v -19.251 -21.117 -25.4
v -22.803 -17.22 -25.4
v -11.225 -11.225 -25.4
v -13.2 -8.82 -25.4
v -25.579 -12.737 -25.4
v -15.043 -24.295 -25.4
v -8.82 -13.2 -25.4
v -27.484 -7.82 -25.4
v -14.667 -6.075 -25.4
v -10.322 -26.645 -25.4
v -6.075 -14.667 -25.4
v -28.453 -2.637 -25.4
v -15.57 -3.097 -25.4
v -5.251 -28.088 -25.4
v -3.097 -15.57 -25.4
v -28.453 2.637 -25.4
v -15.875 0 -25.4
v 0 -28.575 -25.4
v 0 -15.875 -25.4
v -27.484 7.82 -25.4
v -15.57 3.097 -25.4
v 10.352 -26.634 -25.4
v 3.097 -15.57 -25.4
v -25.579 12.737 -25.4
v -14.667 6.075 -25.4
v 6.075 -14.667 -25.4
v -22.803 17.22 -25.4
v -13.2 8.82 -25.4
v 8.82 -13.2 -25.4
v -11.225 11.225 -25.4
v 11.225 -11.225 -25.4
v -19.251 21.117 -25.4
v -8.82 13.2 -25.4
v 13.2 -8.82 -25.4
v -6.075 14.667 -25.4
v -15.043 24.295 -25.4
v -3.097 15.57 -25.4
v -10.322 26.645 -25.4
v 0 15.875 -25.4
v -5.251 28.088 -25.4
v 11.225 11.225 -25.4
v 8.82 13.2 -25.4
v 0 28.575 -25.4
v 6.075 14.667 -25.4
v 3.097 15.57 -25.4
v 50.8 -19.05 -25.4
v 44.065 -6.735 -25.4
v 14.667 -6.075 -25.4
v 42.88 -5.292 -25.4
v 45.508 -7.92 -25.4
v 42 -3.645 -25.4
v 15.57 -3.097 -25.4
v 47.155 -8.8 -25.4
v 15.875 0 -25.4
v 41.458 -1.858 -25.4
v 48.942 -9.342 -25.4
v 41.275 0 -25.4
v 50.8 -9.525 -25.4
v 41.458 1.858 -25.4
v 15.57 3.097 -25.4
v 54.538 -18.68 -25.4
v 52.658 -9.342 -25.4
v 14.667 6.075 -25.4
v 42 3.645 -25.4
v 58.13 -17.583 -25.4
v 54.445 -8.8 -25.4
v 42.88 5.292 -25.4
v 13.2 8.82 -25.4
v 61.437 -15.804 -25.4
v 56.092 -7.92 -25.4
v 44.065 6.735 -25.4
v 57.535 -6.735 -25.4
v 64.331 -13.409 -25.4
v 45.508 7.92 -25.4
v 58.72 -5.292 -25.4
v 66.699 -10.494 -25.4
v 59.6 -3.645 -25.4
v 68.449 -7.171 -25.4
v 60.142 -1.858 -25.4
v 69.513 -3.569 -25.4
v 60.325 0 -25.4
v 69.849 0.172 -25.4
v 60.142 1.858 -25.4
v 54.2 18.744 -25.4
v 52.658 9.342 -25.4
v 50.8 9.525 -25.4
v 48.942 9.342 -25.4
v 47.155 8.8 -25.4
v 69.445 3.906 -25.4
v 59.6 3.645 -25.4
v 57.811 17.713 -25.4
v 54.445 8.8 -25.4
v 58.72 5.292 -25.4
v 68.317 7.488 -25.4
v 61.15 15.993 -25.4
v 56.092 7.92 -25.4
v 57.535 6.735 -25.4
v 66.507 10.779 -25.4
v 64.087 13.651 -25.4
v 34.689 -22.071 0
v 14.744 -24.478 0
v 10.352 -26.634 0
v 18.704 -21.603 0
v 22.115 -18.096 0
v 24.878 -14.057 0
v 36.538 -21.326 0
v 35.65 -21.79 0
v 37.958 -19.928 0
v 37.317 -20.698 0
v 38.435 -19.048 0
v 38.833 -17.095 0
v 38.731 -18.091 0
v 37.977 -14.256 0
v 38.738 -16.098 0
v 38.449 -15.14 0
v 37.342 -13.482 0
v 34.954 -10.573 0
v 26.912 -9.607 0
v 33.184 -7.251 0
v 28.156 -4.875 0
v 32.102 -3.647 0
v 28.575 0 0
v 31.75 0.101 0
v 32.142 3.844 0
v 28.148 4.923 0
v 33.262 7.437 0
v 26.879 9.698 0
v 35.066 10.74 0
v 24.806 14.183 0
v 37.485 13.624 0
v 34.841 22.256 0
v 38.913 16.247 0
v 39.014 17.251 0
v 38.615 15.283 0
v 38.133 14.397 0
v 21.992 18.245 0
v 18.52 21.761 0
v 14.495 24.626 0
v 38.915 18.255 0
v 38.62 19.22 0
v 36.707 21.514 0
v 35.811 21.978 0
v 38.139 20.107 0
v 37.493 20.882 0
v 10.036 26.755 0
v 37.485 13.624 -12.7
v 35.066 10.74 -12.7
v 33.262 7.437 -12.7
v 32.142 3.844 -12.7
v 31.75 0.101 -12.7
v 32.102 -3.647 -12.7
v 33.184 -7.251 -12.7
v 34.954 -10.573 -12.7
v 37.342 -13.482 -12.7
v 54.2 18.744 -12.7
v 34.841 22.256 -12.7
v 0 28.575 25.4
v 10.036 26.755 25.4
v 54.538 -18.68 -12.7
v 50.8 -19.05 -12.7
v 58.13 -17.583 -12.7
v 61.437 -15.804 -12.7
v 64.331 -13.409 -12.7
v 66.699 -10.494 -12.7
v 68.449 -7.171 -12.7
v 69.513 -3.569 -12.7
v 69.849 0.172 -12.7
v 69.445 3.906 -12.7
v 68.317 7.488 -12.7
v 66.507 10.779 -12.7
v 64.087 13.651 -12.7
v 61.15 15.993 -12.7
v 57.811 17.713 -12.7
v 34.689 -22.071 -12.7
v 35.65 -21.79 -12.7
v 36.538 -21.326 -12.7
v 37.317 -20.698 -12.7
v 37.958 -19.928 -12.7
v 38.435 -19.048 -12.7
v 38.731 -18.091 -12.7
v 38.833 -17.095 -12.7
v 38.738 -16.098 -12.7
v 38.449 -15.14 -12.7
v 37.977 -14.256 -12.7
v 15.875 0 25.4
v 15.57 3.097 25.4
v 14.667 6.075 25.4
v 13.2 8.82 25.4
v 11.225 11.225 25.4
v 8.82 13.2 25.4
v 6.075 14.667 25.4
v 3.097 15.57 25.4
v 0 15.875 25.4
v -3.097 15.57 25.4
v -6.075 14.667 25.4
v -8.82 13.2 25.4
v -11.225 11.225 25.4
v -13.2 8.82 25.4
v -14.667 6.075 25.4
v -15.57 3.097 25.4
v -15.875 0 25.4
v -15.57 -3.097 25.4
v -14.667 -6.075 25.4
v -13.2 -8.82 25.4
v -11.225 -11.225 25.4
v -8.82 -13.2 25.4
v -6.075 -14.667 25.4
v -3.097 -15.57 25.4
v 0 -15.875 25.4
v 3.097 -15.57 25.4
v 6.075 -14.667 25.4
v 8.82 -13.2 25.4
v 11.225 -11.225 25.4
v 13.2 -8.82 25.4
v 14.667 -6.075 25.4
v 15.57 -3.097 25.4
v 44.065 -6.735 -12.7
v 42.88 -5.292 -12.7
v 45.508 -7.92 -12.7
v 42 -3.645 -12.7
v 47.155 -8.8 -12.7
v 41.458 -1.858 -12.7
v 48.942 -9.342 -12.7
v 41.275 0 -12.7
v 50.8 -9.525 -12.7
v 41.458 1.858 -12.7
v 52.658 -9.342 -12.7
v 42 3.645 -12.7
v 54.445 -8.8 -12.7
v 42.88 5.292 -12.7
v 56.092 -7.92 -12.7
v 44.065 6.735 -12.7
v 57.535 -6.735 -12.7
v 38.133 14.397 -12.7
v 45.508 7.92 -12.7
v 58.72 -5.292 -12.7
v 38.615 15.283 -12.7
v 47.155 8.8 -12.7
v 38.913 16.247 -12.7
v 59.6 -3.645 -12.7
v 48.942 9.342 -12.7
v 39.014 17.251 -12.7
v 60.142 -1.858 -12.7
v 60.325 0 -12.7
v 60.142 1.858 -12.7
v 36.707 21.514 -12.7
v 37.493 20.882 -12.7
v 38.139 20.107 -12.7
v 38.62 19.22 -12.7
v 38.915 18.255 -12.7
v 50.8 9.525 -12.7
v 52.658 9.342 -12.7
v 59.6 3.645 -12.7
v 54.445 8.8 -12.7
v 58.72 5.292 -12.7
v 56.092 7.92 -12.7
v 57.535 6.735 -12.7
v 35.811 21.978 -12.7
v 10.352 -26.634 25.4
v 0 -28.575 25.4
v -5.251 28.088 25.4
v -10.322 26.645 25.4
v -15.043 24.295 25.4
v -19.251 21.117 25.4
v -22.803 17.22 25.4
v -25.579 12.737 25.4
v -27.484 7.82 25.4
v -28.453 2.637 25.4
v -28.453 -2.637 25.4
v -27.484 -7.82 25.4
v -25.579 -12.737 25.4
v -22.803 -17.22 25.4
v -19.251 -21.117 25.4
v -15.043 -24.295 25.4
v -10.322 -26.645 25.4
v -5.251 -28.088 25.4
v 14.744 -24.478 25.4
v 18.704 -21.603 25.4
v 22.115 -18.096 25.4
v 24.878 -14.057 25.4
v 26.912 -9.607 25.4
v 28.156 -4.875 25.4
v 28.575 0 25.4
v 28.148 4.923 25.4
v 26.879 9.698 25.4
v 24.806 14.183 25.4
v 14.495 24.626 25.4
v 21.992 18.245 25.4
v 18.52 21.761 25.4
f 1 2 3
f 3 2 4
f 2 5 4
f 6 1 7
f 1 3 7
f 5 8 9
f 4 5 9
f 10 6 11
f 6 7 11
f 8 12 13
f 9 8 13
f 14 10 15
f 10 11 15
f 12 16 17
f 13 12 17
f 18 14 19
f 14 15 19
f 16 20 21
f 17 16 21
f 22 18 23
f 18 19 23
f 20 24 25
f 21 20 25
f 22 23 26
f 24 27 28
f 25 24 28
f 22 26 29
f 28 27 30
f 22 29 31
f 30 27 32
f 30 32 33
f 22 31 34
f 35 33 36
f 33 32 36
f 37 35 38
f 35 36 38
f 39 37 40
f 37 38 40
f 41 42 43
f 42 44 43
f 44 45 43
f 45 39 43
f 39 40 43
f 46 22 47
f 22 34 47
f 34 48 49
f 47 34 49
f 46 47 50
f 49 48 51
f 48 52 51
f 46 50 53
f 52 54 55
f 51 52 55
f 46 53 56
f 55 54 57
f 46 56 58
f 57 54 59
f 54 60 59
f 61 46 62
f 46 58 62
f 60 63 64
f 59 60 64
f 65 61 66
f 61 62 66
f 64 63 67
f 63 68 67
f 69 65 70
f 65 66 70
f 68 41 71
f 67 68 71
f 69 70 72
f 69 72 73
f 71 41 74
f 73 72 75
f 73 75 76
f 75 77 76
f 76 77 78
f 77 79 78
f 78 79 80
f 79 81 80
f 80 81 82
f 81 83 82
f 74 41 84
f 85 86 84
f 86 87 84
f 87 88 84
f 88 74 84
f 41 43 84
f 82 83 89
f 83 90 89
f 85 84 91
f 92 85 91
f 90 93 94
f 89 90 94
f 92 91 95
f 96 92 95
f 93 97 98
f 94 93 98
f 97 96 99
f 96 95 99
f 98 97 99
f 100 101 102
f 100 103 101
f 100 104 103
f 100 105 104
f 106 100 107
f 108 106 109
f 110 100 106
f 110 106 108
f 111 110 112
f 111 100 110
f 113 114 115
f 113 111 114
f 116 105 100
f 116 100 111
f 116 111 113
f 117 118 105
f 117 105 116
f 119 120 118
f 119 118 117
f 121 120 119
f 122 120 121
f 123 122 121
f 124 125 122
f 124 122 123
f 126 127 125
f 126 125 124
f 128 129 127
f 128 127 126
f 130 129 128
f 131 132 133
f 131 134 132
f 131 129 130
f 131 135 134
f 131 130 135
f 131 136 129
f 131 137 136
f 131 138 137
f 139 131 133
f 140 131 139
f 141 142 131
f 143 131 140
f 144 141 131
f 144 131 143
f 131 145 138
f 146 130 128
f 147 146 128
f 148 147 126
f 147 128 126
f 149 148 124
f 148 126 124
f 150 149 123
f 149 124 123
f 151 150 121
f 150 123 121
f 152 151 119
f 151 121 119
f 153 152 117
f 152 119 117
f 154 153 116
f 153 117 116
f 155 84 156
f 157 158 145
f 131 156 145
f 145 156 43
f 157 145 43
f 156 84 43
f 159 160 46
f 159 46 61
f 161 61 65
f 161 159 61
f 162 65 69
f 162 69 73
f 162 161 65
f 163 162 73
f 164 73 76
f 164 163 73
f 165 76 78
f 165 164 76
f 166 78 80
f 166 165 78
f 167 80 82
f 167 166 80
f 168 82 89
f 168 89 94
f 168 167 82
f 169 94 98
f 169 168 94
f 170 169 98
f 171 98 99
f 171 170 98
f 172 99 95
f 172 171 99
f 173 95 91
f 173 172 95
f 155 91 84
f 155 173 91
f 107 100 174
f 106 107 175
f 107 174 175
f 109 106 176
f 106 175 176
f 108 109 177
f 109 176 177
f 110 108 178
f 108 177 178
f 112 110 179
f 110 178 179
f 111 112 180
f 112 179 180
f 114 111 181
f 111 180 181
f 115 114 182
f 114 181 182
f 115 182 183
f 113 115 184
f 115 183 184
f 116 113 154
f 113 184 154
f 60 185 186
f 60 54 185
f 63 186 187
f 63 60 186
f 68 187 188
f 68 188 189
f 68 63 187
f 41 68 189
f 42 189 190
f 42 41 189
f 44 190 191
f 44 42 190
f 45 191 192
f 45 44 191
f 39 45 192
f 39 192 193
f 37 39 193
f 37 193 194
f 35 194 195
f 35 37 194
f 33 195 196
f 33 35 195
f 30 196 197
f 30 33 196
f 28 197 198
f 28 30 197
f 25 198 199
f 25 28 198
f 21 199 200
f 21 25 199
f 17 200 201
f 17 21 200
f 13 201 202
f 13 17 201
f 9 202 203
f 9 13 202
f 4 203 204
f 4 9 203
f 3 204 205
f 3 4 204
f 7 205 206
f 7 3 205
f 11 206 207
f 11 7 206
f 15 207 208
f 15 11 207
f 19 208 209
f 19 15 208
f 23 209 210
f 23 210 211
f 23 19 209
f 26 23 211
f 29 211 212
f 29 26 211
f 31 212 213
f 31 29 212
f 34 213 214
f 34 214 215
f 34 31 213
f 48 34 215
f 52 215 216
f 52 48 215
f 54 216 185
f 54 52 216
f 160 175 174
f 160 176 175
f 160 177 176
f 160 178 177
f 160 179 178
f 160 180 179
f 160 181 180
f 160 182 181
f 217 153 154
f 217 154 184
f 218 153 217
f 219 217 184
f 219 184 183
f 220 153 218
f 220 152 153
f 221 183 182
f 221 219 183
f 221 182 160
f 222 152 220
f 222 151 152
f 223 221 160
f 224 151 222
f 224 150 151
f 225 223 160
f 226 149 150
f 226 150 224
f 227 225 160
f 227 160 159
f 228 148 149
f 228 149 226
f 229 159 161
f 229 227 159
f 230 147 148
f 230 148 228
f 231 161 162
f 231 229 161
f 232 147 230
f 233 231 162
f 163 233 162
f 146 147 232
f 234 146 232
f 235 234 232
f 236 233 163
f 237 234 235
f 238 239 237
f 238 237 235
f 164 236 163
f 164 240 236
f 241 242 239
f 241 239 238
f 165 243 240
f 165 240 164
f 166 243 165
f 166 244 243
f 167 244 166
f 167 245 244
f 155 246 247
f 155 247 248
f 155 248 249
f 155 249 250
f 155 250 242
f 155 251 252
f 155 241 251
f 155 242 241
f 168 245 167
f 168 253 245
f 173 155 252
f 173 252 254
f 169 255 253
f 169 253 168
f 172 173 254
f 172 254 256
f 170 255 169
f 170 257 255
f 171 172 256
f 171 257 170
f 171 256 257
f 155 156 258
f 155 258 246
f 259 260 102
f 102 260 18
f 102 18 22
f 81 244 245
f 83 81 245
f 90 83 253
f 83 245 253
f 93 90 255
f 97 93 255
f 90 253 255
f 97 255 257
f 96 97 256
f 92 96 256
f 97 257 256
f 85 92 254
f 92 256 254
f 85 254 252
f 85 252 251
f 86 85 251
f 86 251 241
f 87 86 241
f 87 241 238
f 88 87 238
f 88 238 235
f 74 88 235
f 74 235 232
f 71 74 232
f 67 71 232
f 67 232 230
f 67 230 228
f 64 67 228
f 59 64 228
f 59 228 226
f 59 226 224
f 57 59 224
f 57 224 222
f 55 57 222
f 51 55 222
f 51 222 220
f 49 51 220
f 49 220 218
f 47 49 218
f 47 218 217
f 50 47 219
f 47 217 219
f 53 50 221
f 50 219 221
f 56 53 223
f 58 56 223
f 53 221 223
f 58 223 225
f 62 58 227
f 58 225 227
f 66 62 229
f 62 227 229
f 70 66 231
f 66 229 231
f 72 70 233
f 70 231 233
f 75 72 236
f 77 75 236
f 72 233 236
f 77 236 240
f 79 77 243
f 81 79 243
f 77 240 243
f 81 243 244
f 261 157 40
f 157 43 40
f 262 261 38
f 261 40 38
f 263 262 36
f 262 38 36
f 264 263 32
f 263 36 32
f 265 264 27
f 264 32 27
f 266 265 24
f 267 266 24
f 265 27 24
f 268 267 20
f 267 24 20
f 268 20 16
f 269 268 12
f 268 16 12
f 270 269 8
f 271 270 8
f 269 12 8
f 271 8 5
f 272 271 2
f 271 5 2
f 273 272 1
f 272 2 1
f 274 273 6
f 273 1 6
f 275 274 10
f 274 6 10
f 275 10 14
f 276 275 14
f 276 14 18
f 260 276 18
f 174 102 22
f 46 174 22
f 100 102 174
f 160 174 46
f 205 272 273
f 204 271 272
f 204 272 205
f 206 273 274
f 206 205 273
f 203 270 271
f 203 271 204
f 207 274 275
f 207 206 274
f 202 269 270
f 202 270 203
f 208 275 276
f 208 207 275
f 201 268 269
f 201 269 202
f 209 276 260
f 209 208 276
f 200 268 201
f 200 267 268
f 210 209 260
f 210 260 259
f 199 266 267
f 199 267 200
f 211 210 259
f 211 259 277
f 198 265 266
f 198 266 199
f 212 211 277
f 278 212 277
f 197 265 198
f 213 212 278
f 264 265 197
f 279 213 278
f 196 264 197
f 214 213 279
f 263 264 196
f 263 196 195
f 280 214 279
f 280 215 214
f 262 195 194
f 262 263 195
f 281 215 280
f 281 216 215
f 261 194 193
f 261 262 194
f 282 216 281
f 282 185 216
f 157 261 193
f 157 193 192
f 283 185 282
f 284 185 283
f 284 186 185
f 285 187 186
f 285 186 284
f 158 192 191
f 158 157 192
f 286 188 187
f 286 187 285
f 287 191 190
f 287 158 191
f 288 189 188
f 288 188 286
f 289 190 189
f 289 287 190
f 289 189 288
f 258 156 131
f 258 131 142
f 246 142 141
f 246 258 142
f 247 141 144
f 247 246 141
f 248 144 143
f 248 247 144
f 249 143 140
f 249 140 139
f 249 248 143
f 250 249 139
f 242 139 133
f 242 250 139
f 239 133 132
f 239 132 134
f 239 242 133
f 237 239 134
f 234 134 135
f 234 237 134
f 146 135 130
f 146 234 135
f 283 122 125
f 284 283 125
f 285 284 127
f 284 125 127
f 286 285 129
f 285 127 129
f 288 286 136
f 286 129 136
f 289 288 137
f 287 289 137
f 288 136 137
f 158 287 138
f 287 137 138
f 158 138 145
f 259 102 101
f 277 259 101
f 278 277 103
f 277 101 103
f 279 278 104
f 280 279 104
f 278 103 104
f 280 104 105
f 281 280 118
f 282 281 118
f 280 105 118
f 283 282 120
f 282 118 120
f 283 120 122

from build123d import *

# Parameters (mm, degrees)
F0_R        = 15.875
F0_R_2      = 9.525
F1_DEPTH    = 25.4
F2_DEPTH    = 25.4
F3_DEPTH    = 12.7
F4_T1_DEPTH = 53.6792843218
F4_T3_DEPTH = 61.8868884968


# Not quite as in the source:
# - a fillet or chamfer that OpenCascade refuses, or shapes differently, is made with other operations: its cross-section is extruded or revolved along the edge and cut away or added


with BuildPart() as f1:
    # F0 (on Top) → F1 (new body)
    with BuildSketch(Plane.XY):
        with BuildLine():
            Line((10.035773719, 26.7546981082), (0, 28.575))
            ThreePointArc((0, 28.575), (-28.575, 0), (0, -28.575))
            Line((0, -28.575), (10.3516981132, -26.6340566038))
            ThreePointArc((10.3516981132, -26.6340566038), (23.5831549902, -16.135842888), (28.575, 0))
            ThreePointArc((28.575, 0), (23.4872610048, 16.2751096921), (10.035773719, 26.7546981082))
        make_face()
        Circle(F0_R, mode=Mode.SUBTRACT)
        with BuildLine():
            Line((54.1998407335, 18.7441613039), (10.035773719, 26.7546981082))
            ThreePointArc((10.035773719, 26.7546981082), (23.4872610048, 16.2751096921), (28.575, 0))
            ThreePointArc((28.575, 0), (23.5831549902, -16.135842888), (10.3516981132, -26.6340566038))
            Line((10.3516981132, -26.6340566038), (50.8, -19.05))
            ThreePointArc((50.8, -19.05), (31.8266137334, 1.7067845735), (54.1998407335, 18.7441613039))
        make_face()
        with BuildLine():
            ThreePointArc((69.85, 0), (65.4230890371, 12.2093311452), (54.1998407335, 18.7441613039))
            ThreePointArc((54.1998407335, 18.7441613039), (31.8266137334, 1.7067845735), (50.8, -19.05))
            ThreePointArc((50.8, -19.05), (64.2703841816, -13.4703841816), (69.85, 0))
        make_face()
        with Locations((50.8, 0)):
            Circle(F0_R_2, mode=Mode.SUBTRACT)
    extrude(amount=-F1_DEPTH)

    # F0 (on Top) → F2 (join)
    with BuildSketch(Plane.XY):
        with BuildLine():
            Line((10.035773719, 26.7546981082), (0, 28.575))
            ThreePointArc((0, 28.575), (-28.575, 0), (0, -28.575))
            Line((0, -28.575), (10.3516981132, -26.6340566038))
            ThreePointArc((10.3516981132, -26.6340566038), (23.5831549902, -16.135842888), (28.575, 0))
            ThreePointArc((28.575, 0), (23.4872610048, 16.2751096921), (10.035773719, 26.7546981082))
        make_face()
        Circle(F0_R, mode=Mode.SUBTRACT)
    extrude(amount=F2_DEPTH)

    # F0 (on Top) → F3 (cut)
    with BuildSketch(Plane.XY):
        with BuildLine():
            ThreePointArc((69.85, 0), (65.4230890371, 12.2093311452), (54.1998407335, 18.7441613039))
            ThreePointArc((54.1998407335, 18.7441613039), (31.8266137334, 1.7067845735), (50.8, -19.05))
            ThreePointArc((50.8, -19.05), (64.2703841816, -13.4703841816), (69.85, 0))
        make_face()
        with Locations((50.8, 0)):
            Circle(F0_R_2, mode=Mode.SUBTRACT)
    extrude(amount=-F3_DEPTH, mode=Mode.SUBTRACT)

    # F4: fillet of radius 5.08 on 3 edges, made by hand

    # F4_s2 → F4_t1 (cut)
    with BuildSketch(Plane.XY.offset(-12.7)):
        with BuildLine():
            ThreePointArc((34.6890404798, -22.07080491), (38.6066005598, -18.5769977583), (37.3417274119, -13.4824848951))
            ThreePointArc((37.3417274119, -13.4824848951), (43.5177900762, -17.6031792193), (50.8, -19.05))
            Line((50.8, -19.05), (34.6890404798, -22.07080491))
        make_face()
    extrude(amount=F4_T1_DEPTH, mode=Mode.SUBTRACT)

    # F4_s4 → F4_t3 (cut)
    with BuildSketch(Plane.XY.offset(-12.7)):
        with BuildLine():
            ThreePointArc((34.8409541818, 22.2555017147), (38.7915508617, 18.7449449078), (37.4849973575, 13.6239937108))
            ThreePointArc((37.4849973575, 13.6239937108), (45.2204267219, 18.2145782832), (54.1998407335, 18.7441613039))
            Line((54.1998407335, 18.7441613039), (34.8409541818, 22.2555017147))
        make_face()
    extrude(amount=F4_T3_DEPTH, mode=Mode.SUBTRACT)


solid = f1.part
